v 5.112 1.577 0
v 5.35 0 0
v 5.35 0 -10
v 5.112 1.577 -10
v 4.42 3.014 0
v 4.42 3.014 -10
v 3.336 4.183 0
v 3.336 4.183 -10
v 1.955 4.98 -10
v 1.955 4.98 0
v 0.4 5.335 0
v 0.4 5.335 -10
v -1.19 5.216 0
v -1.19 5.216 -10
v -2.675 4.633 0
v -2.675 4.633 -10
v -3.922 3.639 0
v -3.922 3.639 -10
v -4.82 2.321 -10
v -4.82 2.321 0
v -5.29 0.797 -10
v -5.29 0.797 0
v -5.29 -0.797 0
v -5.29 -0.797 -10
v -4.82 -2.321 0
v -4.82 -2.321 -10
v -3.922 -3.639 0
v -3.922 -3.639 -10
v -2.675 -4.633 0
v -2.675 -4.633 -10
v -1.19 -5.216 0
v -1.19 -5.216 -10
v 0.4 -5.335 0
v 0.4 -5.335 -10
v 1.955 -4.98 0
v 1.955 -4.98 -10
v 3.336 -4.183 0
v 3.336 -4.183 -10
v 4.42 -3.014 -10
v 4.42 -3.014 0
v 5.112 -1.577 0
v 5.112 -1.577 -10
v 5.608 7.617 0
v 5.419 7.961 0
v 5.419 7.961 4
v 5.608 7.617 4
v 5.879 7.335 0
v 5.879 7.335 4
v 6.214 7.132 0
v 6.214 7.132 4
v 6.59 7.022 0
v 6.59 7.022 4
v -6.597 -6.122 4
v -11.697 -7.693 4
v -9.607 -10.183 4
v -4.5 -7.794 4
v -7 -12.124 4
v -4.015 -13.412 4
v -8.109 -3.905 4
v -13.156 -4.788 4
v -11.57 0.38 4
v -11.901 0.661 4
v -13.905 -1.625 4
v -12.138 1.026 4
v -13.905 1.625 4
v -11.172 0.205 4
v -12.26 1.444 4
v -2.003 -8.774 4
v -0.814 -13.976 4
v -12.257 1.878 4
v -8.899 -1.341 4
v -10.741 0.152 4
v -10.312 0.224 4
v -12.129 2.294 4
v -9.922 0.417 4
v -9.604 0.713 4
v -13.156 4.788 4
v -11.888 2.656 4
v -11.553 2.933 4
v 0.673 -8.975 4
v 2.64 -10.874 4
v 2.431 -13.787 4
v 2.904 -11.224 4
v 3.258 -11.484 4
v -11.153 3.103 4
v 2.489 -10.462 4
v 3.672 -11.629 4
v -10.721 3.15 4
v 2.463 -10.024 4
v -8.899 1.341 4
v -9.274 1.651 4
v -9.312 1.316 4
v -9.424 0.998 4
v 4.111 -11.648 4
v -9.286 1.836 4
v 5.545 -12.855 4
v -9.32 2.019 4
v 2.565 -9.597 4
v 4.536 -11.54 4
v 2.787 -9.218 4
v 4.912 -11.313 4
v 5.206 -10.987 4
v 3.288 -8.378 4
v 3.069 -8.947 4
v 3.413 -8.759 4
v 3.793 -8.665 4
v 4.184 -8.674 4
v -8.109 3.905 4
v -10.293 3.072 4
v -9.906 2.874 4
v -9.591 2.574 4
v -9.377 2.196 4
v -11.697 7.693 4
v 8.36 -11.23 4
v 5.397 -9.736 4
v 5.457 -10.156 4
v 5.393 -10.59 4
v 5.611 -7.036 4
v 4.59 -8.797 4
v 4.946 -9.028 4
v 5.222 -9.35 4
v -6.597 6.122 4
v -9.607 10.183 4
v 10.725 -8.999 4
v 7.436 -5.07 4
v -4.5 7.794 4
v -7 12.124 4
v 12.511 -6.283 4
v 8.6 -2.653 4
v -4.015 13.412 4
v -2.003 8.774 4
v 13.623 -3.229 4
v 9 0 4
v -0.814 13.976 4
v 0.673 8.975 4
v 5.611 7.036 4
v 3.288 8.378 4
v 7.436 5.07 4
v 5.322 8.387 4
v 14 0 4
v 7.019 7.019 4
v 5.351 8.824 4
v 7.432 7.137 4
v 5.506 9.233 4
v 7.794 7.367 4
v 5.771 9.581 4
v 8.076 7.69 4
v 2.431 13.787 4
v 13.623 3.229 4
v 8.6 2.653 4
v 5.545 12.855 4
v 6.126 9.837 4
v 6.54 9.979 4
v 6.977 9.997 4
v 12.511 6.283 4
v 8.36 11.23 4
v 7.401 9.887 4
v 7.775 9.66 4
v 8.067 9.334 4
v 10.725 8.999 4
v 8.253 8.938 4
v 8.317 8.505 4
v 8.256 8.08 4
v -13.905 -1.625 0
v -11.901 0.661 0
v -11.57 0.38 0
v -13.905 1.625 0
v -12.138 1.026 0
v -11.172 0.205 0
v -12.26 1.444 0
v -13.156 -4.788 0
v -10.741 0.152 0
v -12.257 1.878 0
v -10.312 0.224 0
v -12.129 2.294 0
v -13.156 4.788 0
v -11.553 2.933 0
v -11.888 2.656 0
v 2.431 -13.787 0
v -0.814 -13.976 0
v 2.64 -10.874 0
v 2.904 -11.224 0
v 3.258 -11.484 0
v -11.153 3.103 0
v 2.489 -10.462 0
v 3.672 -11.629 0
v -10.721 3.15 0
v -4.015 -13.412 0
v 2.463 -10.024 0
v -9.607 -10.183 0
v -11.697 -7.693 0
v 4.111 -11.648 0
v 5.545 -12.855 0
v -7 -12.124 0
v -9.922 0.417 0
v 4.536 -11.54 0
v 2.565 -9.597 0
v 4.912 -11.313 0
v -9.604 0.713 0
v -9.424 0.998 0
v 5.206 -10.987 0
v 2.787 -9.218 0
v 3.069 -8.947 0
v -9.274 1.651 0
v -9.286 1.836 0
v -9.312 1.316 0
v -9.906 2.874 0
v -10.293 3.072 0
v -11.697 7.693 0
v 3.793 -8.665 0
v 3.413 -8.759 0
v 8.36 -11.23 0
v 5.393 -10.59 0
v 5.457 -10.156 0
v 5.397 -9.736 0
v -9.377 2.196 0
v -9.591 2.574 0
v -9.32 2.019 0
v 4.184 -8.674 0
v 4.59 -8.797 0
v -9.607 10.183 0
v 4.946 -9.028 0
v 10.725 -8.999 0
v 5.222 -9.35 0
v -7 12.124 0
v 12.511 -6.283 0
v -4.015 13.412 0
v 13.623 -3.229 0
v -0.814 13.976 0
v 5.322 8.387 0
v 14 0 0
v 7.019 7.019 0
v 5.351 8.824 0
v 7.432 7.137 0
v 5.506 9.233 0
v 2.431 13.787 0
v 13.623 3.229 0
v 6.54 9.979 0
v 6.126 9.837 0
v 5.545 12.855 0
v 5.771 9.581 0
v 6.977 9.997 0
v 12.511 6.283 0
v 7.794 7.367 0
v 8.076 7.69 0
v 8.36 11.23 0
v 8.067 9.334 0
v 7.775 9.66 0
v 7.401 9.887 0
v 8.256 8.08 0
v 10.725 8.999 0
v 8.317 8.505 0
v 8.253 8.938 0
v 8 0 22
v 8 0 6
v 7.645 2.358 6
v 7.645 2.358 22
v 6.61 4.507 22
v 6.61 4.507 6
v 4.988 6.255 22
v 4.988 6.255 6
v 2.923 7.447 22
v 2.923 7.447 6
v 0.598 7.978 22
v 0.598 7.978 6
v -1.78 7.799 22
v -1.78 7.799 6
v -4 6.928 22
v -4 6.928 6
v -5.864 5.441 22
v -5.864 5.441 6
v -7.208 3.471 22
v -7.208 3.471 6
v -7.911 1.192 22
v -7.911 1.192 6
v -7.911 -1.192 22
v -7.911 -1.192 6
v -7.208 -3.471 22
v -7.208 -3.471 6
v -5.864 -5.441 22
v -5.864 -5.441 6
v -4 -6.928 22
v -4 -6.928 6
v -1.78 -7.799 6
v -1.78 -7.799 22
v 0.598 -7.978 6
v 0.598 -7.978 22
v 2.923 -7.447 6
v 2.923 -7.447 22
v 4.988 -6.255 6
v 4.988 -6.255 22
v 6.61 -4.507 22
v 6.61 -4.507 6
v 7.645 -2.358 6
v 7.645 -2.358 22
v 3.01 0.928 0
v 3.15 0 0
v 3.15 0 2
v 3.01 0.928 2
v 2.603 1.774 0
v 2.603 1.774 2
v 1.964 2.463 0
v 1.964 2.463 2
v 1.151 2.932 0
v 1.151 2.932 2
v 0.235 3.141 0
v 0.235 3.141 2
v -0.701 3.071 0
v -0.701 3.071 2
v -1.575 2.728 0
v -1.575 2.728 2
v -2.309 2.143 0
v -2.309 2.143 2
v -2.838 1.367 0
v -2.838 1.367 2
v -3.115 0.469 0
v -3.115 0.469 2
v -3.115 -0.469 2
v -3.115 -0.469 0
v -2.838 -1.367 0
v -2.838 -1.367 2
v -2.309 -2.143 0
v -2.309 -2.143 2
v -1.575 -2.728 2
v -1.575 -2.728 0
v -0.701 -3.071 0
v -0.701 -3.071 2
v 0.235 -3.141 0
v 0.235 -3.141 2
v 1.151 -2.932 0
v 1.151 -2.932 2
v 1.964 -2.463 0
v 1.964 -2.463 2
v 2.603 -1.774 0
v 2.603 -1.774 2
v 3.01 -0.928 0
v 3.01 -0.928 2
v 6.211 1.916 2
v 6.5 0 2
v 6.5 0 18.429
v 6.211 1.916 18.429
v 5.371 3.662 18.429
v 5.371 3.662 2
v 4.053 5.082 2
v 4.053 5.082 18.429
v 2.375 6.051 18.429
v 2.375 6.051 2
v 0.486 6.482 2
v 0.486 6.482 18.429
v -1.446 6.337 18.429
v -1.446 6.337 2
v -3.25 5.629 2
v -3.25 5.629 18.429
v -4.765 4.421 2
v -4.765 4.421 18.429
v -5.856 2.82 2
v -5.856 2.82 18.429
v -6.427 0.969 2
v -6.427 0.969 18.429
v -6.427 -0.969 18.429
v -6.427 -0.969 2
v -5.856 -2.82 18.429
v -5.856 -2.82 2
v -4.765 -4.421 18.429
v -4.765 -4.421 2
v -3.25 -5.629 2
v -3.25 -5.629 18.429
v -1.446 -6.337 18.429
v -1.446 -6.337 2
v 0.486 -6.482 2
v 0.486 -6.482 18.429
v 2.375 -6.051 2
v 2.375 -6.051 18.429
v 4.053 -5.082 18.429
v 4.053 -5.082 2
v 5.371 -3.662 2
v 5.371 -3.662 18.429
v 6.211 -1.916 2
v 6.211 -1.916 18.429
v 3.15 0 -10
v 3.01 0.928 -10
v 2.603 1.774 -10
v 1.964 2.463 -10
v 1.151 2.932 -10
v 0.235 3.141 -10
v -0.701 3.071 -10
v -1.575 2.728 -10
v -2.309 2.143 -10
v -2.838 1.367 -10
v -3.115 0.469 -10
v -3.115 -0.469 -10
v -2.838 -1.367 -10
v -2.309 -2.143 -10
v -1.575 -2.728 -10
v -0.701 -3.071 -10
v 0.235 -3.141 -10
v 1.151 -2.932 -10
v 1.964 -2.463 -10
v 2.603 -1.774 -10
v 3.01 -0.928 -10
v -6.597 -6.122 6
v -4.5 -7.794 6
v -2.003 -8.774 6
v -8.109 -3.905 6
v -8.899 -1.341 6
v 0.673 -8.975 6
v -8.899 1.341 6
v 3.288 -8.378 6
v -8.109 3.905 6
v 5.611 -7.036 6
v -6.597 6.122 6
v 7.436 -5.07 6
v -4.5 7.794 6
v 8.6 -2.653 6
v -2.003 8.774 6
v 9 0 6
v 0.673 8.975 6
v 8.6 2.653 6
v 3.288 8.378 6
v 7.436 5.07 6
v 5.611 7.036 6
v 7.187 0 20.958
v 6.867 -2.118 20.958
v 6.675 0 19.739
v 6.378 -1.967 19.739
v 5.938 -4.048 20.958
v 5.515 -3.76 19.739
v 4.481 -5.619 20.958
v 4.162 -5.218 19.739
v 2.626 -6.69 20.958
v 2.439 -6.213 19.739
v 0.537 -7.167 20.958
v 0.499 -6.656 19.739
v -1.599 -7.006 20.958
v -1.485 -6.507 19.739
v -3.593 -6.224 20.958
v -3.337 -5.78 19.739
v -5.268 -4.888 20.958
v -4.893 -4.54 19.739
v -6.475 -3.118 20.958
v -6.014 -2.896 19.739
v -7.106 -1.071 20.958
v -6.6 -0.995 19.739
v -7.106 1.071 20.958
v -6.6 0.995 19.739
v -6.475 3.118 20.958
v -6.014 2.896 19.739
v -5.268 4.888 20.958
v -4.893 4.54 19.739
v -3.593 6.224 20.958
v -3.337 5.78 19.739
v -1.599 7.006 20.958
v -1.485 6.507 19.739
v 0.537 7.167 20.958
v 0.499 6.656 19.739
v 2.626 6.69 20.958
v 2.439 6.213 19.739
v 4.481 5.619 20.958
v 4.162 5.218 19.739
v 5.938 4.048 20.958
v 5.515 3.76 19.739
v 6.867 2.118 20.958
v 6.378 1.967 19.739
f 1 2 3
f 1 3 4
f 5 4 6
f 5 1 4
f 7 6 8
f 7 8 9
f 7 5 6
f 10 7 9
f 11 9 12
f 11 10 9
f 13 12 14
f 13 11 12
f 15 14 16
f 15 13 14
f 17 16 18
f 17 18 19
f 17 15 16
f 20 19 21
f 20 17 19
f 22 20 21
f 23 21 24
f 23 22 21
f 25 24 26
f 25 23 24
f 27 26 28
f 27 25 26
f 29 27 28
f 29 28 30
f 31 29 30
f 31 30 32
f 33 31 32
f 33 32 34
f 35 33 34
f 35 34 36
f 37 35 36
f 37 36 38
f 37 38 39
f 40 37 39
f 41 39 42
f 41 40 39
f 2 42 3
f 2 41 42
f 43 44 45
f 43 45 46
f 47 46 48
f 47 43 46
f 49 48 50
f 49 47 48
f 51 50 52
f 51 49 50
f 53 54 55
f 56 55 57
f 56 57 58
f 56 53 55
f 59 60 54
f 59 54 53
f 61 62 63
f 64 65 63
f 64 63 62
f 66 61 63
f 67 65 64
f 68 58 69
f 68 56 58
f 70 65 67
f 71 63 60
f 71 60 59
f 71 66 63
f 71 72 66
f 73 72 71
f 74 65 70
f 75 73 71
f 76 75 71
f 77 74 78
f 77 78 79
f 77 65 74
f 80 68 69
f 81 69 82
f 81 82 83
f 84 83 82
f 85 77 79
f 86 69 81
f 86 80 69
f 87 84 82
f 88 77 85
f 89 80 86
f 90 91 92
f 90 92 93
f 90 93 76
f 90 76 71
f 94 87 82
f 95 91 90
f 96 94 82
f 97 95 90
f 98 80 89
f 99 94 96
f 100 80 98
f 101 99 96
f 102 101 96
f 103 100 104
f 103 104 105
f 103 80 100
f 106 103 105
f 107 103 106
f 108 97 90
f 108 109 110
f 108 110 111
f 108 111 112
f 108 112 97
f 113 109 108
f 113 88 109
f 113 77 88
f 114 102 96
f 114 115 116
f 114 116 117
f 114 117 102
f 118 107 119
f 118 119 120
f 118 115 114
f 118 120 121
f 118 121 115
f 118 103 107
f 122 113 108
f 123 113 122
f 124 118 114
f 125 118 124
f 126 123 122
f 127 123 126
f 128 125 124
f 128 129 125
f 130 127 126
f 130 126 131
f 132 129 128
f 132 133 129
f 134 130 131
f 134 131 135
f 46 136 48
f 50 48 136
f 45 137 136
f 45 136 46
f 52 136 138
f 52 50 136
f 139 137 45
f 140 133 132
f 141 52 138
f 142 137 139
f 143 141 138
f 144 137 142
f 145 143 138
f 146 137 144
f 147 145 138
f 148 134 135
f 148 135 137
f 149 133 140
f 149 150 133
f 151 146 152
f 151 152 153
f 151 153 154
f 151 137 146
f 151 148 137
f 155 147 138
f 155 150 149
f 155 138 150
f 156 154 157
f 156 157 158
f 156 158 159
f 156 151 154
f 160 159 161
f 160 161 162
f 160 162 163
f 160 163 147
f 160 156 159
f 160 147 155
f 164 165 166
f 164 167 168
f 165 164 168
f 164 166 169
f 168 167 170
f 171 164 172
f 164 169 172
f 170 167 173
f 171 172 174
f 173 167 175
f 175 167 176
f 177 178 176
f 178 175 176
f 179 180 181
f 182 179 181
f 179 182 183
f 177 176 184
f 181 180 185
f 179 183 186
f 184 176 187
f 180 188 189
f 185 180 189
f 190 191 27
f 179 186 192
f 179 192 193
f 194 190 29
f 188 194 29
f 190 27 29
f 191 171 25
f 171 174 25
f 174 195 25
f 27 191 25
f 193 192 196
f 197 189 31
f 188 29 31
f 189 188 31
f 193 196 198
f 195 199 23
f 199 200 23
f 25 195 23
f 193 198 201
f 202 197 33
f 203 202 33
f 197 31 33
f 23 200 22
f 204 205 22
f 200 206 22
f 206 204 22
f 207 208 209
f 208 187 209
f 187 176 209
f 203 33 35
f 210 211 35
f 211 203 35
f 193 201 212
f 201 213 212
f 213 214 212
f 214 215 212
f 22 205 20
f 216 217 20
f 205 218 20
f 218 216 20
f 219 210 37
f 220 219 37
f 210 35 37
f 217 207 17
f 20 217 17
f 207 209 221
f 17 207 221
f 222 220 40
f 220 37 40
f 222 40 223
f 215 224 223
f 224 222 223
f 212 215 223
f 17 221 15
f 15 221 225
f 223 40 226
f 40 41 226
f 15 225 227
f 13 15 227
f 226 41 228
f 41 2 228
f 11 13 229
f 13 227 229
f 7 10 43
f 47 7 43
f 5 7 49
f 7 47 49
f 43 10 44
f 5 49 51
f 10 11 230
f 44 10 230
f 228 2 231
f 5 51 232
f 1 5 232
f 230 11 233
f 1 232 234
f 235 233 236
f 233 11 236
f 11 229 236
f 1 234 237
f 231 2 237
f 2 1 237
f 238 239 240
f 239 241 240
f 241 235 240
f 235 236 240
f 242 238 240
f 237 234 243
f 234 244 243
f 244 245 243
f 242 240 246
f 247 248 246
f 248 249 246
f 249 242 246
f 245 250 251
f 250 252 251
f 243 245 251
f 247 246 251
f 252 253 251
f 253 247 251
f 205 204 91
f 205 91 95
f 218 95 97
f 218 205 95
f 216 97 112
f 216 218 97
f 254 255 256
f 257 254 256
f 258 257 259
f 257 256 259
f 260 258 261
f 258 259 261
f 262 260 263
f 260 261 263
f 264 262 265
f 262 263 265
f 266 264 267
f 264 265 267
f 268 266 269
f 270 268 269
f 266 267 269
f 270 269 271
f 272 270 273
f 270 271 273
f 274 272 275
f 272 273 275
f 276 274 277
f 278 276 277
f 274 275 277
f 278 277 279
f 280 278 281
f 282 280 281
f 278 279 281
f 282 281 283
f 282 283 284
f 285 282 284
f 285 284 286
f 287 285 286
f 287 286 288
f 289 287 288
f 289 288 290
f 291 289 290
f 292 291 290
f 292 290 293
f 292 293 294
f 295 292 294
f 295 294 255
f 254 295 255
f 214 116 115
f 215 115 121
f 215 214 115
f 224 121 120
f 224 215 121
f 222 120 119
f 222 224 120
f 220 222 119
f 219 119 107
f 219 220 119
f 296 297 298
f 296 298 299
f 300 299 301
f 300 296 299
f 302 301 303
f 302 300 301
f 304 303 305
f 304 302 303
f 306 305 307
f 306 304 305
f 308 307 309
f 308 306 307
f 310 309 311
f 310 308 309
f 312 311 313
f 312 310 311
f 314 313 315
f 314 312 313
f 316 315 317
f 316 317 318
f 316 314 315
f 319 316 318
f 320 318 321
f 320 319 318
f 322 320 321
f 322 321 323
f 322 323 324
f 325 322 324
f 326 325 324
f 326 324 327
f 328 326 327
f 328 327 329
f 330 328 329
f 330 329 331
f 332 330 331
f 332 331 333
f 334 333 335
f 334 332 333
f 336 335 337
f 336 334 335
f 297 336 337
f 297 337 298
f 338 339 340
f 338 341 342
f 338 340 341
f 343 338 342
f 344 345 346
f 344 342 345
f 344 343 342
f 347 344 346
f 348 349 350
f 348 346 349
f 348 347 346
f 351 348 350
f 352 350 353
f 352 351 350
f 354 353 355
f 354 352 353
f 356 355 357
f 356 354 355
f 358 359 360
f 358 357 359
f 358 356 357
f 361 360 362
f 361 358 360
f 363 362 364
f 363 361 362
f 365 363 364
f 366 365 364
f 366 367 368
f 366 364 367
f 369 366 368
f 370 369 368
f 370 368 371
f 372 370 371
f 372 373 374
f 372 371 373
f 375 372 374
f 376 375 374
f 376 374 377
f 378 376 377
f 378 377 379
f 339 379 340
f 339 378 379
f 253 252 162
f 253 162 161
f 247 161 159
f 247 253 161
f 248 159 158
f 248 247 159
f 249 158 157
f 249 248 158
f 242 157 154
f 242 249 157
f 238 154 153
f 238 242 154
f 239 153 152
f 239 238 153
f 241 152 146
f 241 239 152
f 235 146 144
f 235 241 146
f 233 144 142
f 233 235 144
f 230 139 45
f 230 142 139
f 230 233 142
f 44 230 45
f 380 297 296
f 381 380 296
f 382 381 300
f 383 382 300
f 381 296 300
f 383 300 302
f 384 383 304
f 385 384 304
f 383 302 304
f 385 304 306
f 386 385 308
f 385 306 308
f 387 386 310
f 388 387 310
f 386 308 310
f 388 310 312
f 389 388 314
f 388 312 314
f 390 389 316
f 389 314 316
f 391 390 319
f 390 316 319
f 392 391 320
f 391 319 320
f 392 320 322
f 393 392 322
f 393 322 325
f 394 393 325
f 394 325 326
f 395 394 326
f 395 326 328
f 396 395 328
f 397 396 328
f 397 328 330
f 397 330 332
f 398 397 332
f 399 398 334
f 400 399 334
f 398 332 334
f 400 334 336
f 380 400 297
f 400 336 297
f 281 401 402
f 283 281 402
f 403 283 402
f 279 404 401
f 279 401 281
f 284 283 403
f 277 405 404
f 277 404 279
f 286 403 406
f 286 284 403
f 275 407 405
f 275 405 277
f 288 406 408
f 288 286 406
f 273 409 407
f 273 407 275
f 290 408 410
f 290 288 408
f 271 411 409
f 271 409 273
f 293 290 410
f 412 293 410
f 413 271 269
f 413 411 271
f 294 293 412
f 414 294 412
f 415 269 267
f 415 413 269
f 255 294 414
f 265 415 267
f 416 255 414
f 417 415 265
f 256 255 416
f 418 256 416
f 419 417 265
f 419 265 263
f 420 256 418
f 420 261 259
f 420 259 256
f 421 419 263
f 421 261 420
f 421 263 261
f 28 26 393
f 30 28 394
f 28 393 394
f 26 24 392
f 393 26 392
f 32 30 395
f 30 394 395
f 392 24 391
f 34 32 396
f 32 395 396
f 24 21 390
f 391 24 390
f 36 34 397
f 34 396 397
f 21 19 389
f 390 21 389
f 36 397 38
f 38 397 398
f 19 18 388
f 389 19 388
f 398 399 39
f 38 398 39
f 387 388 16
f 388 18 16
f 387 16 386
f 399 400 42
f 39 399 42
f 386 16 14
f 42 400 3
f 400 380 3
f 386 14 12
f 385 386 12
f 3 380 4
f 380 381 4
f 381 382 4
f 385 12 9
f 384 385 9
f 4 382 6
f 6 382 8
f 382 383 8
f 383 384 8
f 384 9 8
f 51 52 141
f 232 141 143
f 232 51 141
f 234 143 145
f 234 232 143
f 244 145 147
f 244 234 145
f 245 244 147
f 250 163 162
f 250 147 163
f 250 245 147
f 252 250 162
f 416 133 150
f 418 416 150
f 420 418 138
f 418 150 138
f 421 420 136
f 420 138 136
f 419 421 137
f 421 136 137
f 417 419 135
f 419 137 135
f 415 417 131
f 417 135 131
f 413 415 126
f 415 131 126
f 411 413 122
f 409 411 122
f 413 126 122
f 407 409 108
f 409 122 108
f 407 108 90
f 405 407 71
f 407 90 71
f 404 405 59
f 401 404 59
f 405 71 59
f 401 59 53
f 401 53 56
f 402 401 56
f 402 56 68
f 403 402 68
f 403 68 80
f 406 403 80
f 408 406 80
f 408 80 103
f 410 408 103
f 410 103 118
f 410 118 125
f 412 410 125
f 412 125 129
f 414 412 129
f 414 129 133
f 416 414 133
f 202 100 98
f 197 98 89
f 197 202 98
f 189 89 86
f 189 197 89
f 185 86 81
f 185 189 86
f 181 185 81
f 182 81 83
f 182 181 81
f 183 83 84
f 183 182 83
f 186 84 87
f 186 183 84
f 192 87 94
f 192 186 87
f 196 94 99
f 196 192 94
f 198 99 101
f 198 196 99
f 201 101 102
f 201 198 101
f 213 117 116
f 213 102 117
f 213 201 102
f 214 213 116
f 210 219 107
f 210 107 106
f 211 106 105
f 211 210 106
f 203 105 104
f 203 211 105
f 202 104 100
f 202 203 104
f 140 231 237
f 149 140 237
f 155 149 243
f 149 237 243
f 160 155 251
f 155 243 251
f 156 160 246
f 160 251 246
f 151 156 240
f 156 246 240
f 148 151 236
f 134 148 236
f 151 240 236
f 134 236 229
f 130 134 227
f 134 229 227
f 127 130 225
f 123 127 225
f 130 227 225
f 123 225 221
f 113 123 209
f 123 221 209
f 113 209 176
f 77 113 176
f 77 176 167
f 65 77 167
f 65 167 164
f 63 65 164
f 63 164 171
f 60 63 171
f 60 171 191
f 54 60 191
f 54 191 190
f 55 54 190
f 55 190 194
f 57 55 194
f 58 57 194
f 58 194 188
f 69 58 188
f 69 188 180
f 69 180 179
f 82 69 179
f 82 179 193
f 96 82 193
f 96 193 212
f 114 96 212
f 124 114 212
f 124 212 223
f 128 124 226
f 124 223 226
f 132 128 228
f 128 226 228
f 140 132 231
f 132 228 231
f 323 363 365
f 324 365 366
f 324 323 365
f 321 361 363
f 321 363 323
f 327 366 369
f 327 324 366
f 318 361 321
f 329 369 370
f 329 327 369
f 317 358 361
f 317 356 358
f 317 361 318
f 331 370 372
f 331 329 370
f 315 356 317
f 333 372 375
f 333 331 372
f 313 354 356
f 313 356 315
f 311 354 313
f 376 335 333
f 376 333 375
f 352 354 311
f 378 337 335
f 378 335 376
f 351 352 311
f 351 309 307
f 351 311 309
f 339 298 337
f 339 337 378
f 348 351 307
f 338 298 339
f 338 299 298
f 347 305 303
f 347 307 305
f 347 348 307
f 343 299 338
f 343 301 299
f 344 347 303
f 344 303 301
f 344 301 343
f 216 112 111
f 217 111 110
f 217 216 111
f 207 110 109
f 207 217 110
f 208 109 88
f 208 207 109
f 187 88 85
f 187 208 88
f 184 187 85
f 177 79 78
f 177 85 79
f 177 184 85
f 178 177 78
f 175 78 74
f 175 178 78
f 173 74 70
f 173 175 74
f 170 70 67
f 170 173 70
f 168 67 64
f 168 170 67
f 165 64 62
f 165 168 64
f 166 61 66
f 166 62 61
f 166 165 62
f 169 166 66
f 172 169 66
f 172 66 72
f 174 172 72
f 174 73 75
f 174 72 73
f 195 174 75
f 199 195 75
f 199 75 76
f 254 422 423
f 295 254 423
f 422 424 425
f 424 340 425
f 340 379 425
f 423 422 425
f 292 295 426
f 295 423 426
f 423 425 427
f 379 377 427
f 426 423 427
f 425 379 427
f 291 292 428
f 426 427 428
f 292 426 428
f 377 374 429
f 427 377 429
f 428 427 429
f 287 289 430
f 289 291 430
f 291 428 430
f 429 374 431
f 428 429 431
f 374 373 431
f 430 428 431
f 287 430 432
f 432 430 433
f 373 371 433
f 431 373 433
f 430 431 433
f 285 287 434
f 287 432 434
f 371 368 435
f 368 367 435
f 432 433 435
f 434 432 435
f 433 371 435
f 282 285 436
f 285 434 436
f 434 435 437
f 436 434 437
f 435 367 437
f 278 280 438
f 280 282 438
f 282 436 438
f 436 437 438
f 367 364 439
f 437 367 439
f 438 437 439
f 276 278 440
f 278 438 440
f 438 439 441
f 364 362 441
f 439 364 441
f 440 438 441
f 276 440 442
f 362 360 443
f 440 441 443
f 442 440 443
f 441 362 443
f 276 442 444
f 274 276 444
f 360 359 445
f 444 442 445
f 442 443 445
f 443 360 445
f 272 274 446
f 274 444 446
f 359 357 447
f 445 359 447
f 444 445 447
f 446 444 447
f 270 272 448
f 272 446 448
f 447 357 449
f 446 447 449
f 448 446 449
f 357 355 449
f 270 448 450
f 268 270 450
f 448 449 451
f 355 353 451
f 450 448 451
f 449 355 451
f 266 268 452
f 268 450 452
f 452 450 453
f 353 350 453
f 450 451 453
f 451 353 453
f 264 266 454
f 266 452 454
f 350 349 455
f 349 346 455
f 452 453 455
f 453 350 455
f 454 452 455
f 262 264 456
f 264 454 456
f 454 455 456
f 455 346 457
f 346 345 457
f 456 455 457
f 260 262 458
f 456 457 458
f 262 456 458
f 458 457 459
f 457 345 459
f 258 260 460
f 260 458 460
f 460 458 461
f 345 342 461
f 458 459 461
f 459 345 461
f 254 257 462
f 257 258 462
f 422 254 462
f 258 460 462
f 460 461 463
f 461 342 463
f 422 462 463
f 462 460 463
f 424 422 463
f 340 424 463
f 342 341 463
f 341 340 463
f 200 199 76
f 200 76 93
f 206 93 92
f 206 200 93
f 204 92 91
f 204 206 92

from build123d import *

# Parameters (mm, degrees)
F0_R      = 14
F0_R_2    = 3.15
F1_DEPTH  = 4
F2_R      = 9
F3_DEPTH  = 6
F4_R      = 8
F5_DEPTH  = 22
F6_R      = 6.5
F7_DEPTH  = 25
F10_DEPTH = 2
F11_DEPTH = 25
F9_R      = 5.35
F9_R_2    = 3.15
F12_DEPTH = 10


# Not quite as in the source:
# - a fillet or chamfer that OpenCascade refuses, or shapes differently, is made with other operations: its cross-section is extruded or revolved along the edge and cut away or added


with BuildPart() as f1:
    # F0 (on Top) → F1 (new body)
    with BuildSketch(Plane.XY):
        Circle(F0_R)
        Circle(F0_R_2, mode=Mode.SUBTRACT)
    extrude(amount=F1_DEPTH)

    # F2 (on Top) → F3 (join)
    with BuildSketch(Plane.XY):
        Circle(F2_R)
    extrude(amount=F3_DEPTH)

    # F4 (on Top) → F5 (join)
    with BuildSketch(Plane.XY):
        Circle(F4_R)
    extrude(amount=F5_DEPTH)

    # F6 (on Top) → F7 (cut)
    with BuildSketch(Plane.XY):
        Circle(F6_R)
    extrude(amount=F7_DEPTH, mode=Mode.SUBTRACT)

    # F0 (on Top) → F10 (join)
    with BuildSketch(Plane.XY):
        Circle(F0_R)
        Circle(F0_R_2, mode=Mode.SUBTRACT)
    extrude(amount=F10_DEPTH)

    # F8 (on Top) → F11 (cut)
    with BuildSketch(Plane.XY):
        with BuildLine():
            Line((3.9571776785, -10.1563155141), (2.7867408683, -9.2181909629))
            ThreePointArc((2.7867408683, -9.2181909629), (3.460013327, -11.5715284336), (5.4571776785, -10.1563155141))
            ThreePointArc((5.4571776785, -10.1563155141), (5.0953410965, -9.1792873497), (4.1843989666, -8.6736252274))
            Line((4.1843989666, -8.6736252274), (3.9571776785, -10.1563155141))
        make_face()
        with BuildLine():
            ThreePointArc((4.1843989666, -8.6736252274), (3.4126119429, -8.7586574158), (2.7867408683, -9.2181909629))
            Line((2.7867408683, -9.2181909629), (3.9571776785, -10.1563155141))
            Line((3.9571776785, -10.1563155141), (4.1843989666, -8.6736252274))
        make_face()
        with BuildLine():
            Line((-9.6037792731, 0.7130168091), (-10.7742160833, 1.6511413602))
            Line((-10.7742160833, 1.6511413602), (-9.376557985, 2.1957070958))
            ThreePointArc((-9.376557985, 2.1957070958), (-12.2569063699, 1.8783626483), (-9.6037792731, 0.7130168091))
        make_face()
        with BuildLine():
            Line((-9.376557985, 2.1957070958), (-10.7742160833, 1.6511413602))
            Line((-10.7742160833, 1.6511413602), (-9.6037792731, 0.7130168091))
            ThreePointArc((-9.6037792731, 0.7130168091), (-9.3590031637, 1.1539770087), (-9.2742160833, 1.6511413602))
            ThreePointArc((-9.2742160833, 1.6511413602), (-9.3000235674, 1.9281908617), (-9.376557985, 2.1957070958))
        make_face()
        with BuildLine():
            ThreePointArc((8.3170384048, 8.5051741539), (6.5399889033, 9.9793666697), (5.4193803065, 7.9606084183))
            Line((5.4193803065, 7.9606084183), (6.8170384048, 8.5051741539))
            Line((6.8170384048, 8.5051741539), (6.5898171167, 7.0224838672))
            ThreePointArc((6.5898171167, 7.0224838672), (7.7940665691, 7.3670107359), (8.3170384048, 8.5051741539))
        make_face()
        with BuildLine():
            Line((6.8170384048, 8.5051741539), (5.4193803065, 7.9606084183))
            ThreePointArc((5.4193803065, 7.9606084183), (5.8789138537, 7.3347373437), (6.5898171167, 7.0224838672))
            Line((6.5898171167, 7.0224838672), (6.8170384048, 8.5051741539))
        make_face()
    extrude(amount=F11_DEPTH, mode=Mode.SUBTRACT)

    # F9 (on Top) → F12 (join)
    with BuildSketch(Plane.XY):
        Circle(F9_R)
        Circle(F9_R_2, mode=Mode.SUBTRACT)
    extrude(amount=-F12_DEPTH)

    # F13: fillet of radius 5 on 1 edges, made by hand

    # F13_s1 → F13_t2 (revolve, cut)
    with BuildSketch(Plane.XZ):
        with BuildLine():
            ThreePointArc((8, 22), (6.8902277714, 20.3657774588), (6.5, 18.4292857857))
            Line((6.5, 18.4292857857), (6.5, 22))
            Line((6.5, 22), (8, 22))
        make_face()
    revolve(axis=Axis((0, 0, 22), (0, 0, -1)), mode=Mode.SUBTRACT)


solid = f1.part
